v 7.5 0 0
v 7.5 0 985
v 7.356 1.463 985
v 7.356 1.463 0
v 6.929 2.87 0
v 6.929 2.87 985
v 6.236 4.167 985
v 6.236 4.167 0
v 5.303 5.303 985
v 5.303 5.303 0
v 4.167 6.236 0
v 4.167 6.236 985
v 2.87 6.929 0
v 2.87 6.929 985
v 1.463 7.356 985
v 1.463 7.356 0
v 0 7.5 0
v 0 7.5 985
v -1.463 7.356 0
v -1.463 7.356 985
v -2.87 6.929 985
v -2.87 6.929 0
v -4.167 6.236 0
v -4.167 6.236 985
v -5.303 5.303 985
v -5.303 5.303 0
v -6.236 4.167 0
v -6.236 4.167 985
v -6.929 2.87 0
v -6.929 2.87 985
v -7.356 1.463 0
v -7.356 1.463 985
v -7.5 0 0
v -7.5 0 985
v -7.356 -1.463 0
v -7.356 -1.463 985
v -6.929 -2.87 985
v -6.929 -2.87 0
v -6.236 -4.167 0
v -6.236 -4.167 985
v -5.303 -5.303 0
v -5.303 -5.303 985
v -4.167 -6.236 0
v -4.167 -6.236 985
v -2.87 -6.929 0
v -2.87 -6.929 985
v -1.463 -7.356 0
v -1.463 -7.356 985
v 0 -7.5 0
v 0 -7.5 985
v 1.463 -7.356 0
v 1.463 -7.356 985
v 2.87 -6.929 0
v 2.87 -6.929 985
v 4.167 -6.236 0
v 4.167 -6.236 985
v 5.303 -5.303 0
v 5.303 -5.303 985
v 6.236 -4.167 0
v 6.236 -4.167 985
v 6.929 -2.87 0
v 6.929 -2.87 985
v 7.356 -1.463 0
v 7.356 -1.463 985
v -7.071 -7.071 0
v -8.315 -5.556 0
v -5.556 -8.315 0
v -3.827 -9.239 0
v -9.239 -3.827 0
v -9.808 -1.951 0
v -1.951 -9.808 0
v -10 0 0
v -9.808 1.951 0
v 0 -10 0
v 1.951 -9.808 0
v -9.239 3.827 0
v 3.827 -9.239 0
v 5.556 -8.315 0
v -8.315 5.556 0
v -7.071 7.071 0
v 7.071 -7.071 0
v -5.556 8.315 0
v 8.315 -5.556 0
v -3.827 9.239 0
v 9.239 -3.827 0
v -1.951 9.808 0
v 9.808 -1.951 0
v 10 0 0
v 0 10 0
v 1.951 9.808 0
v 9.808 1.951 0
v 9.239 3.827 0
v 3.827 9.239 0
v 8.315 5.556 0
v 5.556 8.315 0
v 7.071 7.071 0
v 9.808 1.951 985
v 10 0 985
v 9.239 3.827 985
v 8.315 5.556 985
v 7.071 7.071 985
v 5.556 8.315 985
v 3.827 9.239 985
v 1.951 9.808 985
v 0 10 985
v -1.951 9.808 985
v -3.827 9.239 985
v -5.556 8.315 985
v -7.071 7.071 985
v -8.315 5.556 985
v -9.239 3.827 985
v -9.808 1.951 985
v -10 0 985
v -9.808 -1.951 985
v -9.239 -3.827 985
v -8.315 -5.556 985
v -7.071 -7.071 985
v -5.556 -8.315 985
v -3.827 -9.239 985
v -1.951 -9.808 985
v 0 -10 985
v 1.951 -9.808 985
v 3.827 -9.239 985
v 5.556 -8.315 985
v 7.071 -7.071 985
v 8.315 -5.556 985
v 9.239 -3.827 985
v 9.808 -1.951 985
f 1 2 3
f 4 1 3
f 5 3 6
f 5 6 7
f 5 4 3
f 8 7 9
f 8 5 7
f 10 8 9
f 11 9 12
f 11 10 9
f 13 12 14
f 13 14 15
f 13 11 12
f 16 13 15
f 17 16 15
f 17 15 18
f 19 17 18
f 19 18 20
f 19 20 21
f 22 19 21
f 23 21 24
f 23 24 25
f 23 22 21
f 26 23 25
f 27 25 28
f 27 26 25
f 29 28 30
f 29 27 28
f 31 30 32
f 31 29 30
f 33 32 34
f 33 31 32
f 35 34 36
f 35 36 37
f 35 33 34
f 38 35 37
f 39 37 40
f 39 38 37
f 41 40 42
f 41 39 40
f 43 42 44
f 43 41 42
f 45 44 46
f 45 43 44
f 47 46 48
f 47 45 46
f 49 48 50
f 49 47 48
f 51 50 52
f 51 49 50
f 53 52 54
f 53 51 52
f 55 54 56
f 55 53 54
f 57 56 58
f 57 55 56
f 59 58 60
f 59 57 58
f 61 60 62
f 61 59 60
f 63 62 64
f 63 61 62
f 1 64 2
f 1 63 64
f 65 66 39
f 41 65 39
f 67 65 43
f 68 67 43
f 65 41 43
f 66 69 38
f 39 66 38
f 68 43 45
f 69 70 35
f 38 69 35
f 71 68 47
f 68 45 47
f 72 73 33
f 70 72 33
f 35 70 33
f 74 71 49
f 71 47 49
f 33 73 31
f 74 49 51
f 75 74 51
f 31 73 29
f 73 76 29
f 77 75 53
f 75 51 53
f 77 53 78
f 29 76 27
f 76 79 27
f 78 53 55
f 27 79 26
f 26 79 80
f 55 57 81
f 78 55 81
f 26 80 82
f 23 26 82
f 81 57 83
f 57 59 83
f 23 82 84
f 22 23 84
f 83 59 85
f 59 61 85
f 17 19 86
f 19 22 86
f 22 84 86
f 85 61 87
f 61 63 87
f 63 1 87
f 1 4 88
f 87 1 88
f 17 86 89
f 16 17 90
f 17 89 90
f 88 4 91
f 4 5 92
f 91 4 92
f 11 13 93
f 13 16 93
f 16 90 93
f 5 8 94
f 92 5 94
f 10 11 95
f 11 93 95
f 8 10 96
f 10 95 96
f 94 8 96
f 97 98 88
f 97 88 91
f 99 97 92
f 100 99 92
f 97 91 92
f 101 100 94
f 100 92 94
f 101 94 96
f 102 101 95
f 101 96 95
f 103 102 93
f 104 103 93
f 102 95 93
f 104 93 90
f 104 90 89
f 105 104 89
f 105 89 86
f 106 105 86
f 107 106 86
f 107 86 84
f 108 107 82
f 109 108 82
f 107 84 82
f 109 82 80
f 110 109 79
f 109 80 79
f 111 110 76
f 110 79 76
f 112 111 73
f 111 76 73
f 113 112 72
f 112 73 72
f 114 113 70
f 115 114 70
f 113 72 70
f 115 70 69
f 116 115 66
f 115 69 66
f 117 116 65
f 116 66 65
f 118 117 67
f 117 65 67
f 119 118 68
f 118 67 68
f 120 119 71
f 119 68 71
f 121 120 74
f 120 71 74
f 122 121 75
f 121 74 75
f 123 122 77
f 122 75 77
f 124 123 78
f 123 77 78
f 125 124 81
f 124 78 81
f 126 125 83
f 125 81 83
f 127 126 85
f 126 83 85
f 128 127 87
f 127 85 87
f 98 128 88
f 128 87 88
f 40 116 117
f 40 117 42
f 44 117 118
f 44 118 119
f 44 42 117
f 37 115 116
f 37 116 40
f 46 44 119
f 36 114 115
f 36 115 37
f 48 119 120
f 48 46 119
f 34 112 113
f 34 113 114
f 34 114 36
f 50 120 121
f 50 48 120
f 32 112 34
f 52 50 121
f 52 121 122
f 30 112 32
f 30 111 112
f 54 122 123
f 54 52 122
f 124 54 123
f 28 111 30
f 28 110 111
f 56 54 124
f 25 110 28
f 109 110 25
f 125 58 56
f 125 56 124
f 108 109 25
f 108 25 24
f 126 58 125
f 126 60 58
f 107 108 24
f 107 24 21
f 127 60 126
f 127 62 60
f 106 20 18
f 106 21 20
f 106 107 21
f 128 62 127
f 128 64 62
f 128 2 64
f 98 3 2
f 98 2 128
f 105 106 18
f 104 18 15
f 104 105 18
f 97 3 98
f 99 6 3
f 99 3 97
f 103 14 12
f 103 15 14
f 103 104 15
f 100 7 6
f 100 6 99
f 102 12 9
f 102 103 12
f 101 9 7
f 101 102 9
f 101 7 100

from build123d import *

# Parameters (mm, degrees)
F0_R     = 10
F0_R_2   = 7.5
F1_DEPTH = 985
F3_DEPTH = 1005


with BuildPart() as f1:
    # F0 (on Top) → F1 (new body)
    with BuildSketch(Plane.XY):
        Circle(F0_R)
        Circle(F0_R_2, mode=Mode.SUBTRACT)
    extrude(amount=F1_DEPTH)


with BuildPart() as f3:
    # F0 (on Top) → F3 (new body)
    with BuildSketch(Plane.XY):
        with Locations((149.209142, -44.897571)):
            Circle(F0_R)
        with Locations((149.209142, -44.897571)):
            Circle(F0_R_2, mode=Mode.SUBTRACT)
    extrude(amount=F3_DEPTH)


solid = f1.part
